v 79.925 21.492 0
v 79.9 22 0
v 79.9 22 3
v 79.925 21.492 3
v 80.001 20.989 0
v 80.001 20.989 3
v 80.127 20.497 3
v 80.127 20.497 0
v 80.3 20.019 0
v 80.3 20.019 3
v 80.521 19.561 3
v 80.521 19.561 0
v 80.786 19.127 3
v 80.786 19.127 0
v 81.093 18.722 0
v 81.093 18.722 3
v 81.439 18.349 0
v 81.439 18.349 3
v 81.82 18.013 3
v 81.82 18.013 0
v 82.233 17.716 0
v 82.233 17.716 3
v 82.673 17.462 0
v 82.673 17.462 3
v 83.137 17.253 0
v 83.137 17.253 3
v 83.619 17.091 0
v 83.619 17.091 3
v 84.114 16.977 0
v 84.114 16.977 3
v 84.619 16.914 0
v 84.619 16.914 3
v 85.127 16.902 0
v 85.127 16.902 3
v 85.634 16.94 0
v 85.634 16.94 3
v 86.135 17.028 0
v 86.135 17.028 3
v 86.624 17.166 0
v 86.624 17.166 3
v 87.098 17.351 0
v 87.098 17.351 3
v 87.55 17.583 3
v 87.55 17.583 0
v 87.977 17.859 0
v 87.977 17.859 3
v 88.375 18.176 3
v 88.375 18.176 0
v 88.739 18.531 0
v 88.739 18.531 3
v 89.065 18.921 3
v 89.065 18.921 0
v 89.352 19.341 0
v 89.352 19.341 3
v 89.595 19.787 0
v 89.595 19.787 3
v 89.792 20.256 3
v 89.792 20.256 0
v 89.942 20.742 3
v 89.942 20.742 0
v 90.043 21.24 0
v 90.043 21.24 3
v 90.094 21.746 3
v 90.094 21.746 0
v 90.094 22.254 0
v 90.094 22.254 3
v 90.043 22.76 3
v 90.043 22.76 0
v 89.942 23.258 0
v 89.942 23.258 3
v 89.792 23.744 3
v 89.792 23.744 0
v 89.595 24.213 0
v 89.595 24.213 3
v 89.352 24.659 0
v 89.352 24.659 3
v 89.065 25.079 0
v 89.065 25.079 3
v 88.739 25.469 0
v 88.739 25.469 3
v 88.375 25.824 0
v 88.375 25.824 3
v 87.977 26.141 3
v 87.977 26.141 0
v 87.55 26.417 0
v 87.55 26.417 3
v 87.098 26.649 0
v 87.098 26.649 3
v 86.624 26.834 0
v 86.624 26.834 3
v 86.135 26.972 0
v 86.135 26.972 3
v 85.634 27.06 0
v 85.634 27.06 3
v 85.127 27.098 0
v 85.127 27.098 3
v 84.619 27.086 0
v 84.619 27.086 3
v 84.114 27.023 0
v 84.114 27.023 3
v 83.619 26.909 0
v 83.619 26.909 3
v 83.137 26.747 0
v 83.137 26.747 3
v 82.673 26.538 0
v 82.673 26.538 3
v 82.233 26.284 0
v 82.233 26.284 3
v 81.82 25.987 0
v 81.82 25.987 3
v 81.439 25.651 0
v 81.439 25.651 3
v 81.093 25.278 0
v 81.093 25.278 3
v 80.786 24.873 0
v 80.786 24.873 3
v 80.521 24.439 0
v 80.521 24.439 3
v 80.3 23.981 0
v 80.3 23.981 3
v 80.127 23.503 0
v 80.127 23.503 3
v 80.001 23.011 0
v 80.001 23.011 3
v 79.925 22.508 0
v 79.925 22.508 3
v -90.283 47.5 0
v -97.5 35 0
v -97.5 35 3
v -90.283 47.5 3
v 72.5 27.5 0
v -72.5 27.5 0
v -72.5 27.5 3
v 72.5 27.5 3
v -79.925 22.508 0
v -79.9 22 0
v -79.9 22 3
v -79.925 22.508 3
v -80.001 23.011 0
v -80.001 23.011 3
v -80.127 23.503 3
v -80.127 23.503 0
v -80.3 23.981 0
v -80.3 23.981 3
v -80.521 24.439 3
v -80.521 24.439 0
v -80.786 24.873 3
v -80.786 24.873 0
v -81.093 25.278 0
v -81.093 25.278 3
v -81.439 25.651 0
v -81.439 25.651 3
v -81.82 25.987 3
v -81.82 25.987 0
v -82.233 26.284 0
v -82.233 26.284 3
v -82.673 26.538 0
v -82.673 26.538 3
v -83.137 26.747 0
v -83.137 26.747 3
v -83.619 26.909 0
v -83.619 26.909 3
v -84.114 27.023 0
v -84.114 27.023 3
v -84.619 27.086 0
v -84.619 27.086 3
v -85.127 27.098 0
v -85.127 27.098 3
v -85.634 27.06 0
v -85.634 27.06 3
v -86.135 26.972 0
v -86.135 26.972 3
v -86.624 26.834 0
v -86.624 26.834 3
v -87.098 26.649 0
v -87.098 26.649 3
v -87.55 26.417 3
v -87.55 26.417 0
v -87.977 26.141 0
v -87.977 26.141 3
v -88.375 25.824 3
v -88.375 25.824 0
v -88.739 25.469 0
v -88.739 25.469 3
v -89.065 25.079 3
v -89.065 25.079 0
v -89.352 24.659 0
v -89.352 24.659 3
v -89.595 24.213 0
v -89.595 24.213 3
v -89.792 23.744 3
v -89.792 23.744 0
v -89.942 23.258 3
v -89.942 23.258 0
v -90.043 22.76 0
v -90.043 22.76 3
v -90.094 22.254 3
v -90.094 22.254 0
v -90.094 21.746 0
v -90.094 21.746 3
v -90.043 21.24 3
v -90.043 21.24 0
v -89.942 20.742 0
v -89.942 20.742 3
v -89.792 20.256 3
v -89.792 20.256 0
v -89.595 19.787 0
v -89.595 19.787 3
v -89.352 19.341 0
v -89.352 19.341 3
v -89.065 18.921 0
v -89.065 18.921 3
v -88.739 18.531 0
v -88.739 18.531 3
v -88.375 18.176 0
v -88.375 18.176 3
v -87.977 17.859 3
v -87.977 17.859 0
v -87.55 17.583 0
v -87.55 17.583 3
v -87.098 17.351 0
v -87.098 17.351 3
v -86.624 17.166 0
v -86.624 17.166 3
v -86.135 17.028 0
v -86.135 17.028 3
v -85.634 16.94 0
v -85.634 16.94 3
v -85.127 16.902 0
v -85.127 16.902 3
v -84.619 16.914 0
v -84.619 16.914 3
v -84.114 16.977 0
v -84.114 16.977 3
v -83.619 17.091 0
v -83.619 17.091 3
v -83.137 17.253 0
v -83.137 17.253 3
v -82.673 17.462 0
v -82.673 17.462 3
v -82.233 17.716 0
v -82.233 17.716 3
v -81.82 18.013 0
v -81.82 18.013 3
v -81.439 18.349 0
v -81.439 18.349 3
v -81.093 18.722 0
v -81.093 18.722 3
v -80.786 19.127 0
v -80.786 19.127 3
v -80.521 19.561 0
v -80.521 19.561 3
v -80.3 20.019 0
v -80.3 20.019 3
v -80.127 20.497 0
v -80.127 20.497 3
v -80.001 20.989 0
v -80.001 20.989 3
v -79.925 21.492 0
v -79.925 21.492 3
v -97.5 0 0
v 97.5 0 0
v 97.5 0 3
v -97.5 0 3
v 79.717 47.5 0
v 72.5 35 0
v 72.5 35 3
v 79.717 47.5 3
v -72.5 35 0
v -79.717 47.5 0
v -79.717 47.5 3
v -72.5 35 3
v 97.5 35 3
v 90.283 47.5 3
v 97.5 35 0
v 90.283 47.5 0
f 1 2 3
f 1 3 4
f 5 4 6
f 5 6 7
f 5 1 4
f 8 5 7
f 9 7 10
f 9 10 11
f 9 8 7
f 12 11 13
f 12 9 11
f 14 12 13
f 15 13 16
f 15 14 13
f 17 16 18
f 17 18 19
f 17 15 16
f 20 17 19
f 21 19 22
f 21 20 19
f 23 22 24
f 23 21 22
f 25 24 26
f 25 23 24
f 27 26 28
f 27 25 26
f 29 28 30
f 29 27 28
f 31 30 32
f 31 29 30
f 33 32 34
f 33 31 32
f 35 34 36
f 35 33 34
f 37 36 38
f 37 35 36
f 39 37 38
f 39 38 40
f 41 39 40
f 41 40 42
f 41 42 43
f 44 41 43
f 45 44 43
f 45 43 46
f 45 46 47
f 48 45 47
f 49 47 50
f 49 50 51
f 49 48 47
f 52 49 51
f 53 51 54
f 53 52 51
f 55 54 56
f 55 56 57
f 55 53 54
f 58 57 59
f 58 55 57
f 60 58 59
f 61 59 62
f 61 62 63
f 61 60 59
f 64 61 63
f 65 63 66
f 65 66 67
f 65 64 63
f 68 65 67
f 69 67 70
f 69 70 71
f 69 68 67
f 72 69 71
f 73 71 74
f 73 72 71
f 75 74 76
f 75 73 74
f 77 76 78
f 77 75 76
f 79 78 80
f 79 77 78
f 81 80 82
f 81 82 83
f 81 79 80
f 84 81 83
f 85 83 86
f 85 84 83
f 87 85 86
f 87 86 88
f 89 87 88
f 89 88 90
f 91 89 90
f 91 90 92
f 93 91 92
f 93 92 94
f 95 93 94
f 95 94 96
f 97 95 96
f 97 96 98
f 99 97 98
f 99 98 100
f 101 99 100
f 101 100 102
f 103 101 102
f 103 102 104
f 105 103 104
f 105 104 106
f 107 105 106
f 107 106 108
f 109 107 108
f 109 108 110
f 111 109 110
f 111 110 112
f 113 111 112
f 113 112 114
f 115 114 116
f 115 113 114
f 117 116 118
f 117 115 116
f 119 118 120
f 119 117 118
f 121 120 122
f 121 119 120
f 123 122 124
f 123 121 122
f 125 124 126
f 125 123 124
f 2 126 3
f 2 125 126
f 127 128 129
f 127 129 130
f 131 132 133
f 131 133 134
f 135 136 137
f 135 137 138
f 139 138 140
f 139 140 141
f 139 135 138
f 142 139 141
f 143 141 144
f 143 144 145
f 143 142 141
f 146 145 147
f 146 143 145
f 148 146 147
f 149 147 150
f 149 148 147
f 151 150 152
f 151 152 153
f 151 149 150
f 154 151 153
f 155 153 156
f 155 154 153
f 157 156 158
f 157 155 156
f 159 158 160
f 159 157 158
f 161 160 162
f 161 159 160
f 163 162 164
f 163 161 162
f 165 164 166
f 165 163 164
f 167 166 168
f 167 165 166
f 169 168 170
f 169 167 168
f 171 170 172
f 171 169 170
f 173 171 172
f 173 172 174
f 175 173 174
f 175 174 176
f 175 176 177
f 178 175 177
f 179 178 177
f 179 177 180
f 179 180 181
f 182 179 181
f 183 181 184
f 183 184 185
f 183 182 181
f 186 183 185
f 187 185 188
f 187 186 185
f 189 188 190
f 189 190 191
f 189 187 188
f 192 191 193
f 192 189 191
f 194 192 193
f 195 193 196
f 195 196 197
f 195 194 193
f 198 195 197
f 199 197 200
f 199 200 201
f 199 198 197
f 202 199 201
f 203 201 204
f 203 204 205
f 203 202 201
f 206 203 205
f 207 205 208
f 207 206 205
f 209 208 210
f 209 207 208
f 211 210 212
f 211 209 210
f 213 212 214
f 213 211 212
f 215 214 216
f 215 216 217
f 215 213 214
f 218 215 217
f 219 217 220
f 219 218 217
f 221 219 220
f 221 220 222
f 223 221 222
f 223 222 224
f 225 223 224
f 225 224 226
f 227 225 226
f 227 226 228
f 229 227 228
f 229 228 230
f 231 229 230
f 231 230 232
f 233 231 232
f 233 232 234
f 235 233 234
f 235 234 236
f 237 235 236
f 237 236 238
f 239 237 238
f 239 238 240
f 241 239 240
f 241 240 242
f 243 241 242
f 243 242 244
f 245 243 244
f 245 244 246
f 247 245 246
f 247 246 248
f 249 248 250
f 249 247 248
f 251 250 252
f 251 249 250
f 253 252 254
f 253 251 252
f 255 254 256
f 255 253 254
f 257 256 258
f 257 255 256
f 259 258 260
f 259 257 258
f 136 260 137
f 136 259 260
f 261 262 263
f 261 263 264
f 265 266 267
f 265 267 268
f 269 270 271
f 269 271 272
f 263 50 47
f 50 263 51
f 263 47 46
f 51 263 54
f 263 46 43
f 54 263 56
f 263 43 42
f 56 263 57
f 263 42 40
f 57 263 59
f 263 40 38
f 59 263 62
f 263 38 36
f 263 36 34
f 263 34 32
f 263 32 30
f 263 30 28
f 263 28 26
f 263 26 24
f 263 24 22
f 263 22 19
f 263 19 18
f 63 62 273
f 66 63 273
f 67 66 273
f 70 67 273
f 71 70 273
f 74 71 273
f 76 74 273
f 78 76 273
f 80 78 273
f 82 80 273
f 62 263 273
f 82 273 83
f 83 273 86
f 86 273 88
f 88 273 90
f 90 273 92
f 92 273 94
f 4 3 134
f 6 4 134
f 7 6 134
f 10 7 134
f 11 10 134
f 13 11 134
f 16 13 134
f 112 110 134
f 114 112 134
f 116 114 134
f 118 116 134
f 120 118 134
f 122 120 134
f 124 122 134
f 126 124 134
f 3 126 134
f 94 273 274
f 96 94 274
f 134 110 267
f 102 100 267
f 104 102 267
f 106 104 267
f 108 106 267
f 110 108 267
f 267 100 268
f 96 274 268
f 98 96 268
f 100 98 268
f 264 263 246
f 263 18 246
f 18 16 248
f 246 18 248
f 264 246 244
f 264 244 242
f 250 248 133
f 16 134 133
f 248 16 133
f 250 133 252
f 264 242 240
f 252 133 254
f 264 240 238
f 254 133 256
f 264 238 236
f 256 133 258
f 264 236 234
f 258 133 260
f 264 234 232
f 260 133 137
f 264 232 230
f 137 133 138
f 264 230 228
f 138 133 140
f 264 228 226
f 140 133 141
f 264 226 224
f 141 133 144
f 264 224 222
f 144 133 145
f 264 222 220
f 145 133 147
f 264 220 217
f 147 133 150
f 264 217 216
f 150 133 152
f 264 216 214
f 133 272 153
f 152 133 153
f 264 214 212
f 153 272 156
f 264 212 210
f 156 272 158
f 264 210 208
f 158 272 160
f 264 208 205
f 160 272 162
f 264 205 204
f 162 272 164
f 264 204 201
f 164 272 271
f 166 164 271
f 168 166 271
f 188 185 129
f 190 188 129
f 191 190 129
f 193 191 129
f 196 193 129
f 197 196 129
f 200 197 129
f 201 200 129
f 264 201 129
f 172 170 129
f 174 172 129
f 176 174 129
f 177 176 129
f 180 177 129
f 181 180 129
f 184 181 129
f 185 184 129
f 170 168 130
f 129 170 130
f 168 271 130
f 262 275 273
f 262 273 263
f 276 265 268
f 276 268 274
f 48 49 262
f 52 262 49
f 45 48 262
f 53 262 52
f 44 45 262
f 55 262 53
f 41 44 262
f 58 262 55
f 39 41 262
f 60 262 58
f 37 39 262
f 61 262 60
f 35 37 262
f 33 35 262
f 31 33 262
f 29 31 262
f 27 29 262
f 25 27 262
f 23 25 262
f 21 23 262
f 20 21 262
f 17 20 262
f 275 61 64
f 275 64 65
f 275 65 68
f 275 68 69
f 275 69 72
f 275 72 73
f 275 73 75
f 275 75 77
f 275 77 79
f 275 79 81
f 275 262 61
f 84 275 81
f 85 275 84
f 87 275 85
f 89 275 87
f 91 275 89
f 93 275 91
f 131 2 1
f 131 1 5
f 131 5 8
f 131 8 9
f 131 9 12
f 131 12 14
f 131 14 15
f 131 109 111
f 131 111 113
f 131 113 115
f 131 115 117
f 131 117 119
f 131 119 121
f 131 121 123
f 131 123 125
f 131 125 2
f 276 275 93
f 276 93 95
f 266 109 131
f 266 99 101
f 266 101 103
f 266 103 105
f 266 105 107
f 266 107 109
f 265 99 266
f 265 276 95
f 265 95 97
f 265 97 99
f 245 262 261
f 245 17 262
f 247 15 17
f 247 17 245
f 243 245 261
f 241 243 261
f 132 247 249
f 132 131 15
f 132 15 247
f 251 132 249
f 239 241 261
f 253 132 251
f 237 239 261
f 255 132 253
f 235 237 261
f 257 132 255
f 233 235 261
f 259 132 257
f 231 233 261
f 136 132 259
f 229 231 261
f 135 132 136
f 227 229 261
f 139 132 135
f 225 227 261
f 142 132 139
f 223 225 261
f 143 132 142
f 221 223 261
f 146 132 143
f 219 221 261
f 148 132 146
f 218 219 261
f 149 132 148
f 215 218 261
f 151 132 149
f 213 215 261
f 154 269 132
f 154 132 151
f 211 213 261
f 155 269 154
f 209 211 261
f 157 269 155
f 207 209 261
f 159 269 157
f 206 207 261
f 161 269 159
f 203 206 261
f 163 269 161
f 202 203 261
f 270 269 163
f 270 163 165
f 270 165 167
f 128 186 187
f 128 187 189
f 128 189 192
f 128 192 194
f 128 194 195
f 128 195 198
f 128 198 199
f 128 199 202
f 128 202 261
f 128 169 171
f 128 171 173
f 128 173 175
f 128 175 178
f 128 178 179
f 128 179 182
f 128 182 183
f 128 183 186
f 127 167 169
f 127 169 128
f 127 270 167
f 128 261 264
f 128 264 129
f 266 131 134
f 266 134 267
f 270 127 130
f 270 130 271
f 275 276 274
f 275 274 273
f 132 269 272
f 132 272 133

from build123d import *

# Parameters (mm, degrees)
SZKIC1_R                    = 5.1
DODANIE_WYCI_GNI_CIE1_DEPTH = 3


with BuildPart() as part:
    # Szkic1 → Dodanie-wyciągnięcie1 (new body)
    with BuildSketch(Plane.XY):
        Polygon((97.5, 0), (-97.5, 0), (-97.5, 35), (-90.283121635, 47.5), (-79.716878365, 47.5), (-72.5, 35), (-72.5, 27.5), (72.5, 27.5), (72.5, 35), (79.716878365, 47.5), (90.283121635, 47.5), (97.5, 35), align=None)
        with Locations((-85, 22)):
            Circle(SZKIC1_R, mode=Mode.SUBTRACT)
        with Locations(Location((85, 22, 0), (0, 0, 180))):
            Circle(SZKIC1_R, mode=Mode.SUBTRACT)
    extrude(amount=DODANIE_WYCI_GNI_CIE1_DEPTH)


solid = part.part
